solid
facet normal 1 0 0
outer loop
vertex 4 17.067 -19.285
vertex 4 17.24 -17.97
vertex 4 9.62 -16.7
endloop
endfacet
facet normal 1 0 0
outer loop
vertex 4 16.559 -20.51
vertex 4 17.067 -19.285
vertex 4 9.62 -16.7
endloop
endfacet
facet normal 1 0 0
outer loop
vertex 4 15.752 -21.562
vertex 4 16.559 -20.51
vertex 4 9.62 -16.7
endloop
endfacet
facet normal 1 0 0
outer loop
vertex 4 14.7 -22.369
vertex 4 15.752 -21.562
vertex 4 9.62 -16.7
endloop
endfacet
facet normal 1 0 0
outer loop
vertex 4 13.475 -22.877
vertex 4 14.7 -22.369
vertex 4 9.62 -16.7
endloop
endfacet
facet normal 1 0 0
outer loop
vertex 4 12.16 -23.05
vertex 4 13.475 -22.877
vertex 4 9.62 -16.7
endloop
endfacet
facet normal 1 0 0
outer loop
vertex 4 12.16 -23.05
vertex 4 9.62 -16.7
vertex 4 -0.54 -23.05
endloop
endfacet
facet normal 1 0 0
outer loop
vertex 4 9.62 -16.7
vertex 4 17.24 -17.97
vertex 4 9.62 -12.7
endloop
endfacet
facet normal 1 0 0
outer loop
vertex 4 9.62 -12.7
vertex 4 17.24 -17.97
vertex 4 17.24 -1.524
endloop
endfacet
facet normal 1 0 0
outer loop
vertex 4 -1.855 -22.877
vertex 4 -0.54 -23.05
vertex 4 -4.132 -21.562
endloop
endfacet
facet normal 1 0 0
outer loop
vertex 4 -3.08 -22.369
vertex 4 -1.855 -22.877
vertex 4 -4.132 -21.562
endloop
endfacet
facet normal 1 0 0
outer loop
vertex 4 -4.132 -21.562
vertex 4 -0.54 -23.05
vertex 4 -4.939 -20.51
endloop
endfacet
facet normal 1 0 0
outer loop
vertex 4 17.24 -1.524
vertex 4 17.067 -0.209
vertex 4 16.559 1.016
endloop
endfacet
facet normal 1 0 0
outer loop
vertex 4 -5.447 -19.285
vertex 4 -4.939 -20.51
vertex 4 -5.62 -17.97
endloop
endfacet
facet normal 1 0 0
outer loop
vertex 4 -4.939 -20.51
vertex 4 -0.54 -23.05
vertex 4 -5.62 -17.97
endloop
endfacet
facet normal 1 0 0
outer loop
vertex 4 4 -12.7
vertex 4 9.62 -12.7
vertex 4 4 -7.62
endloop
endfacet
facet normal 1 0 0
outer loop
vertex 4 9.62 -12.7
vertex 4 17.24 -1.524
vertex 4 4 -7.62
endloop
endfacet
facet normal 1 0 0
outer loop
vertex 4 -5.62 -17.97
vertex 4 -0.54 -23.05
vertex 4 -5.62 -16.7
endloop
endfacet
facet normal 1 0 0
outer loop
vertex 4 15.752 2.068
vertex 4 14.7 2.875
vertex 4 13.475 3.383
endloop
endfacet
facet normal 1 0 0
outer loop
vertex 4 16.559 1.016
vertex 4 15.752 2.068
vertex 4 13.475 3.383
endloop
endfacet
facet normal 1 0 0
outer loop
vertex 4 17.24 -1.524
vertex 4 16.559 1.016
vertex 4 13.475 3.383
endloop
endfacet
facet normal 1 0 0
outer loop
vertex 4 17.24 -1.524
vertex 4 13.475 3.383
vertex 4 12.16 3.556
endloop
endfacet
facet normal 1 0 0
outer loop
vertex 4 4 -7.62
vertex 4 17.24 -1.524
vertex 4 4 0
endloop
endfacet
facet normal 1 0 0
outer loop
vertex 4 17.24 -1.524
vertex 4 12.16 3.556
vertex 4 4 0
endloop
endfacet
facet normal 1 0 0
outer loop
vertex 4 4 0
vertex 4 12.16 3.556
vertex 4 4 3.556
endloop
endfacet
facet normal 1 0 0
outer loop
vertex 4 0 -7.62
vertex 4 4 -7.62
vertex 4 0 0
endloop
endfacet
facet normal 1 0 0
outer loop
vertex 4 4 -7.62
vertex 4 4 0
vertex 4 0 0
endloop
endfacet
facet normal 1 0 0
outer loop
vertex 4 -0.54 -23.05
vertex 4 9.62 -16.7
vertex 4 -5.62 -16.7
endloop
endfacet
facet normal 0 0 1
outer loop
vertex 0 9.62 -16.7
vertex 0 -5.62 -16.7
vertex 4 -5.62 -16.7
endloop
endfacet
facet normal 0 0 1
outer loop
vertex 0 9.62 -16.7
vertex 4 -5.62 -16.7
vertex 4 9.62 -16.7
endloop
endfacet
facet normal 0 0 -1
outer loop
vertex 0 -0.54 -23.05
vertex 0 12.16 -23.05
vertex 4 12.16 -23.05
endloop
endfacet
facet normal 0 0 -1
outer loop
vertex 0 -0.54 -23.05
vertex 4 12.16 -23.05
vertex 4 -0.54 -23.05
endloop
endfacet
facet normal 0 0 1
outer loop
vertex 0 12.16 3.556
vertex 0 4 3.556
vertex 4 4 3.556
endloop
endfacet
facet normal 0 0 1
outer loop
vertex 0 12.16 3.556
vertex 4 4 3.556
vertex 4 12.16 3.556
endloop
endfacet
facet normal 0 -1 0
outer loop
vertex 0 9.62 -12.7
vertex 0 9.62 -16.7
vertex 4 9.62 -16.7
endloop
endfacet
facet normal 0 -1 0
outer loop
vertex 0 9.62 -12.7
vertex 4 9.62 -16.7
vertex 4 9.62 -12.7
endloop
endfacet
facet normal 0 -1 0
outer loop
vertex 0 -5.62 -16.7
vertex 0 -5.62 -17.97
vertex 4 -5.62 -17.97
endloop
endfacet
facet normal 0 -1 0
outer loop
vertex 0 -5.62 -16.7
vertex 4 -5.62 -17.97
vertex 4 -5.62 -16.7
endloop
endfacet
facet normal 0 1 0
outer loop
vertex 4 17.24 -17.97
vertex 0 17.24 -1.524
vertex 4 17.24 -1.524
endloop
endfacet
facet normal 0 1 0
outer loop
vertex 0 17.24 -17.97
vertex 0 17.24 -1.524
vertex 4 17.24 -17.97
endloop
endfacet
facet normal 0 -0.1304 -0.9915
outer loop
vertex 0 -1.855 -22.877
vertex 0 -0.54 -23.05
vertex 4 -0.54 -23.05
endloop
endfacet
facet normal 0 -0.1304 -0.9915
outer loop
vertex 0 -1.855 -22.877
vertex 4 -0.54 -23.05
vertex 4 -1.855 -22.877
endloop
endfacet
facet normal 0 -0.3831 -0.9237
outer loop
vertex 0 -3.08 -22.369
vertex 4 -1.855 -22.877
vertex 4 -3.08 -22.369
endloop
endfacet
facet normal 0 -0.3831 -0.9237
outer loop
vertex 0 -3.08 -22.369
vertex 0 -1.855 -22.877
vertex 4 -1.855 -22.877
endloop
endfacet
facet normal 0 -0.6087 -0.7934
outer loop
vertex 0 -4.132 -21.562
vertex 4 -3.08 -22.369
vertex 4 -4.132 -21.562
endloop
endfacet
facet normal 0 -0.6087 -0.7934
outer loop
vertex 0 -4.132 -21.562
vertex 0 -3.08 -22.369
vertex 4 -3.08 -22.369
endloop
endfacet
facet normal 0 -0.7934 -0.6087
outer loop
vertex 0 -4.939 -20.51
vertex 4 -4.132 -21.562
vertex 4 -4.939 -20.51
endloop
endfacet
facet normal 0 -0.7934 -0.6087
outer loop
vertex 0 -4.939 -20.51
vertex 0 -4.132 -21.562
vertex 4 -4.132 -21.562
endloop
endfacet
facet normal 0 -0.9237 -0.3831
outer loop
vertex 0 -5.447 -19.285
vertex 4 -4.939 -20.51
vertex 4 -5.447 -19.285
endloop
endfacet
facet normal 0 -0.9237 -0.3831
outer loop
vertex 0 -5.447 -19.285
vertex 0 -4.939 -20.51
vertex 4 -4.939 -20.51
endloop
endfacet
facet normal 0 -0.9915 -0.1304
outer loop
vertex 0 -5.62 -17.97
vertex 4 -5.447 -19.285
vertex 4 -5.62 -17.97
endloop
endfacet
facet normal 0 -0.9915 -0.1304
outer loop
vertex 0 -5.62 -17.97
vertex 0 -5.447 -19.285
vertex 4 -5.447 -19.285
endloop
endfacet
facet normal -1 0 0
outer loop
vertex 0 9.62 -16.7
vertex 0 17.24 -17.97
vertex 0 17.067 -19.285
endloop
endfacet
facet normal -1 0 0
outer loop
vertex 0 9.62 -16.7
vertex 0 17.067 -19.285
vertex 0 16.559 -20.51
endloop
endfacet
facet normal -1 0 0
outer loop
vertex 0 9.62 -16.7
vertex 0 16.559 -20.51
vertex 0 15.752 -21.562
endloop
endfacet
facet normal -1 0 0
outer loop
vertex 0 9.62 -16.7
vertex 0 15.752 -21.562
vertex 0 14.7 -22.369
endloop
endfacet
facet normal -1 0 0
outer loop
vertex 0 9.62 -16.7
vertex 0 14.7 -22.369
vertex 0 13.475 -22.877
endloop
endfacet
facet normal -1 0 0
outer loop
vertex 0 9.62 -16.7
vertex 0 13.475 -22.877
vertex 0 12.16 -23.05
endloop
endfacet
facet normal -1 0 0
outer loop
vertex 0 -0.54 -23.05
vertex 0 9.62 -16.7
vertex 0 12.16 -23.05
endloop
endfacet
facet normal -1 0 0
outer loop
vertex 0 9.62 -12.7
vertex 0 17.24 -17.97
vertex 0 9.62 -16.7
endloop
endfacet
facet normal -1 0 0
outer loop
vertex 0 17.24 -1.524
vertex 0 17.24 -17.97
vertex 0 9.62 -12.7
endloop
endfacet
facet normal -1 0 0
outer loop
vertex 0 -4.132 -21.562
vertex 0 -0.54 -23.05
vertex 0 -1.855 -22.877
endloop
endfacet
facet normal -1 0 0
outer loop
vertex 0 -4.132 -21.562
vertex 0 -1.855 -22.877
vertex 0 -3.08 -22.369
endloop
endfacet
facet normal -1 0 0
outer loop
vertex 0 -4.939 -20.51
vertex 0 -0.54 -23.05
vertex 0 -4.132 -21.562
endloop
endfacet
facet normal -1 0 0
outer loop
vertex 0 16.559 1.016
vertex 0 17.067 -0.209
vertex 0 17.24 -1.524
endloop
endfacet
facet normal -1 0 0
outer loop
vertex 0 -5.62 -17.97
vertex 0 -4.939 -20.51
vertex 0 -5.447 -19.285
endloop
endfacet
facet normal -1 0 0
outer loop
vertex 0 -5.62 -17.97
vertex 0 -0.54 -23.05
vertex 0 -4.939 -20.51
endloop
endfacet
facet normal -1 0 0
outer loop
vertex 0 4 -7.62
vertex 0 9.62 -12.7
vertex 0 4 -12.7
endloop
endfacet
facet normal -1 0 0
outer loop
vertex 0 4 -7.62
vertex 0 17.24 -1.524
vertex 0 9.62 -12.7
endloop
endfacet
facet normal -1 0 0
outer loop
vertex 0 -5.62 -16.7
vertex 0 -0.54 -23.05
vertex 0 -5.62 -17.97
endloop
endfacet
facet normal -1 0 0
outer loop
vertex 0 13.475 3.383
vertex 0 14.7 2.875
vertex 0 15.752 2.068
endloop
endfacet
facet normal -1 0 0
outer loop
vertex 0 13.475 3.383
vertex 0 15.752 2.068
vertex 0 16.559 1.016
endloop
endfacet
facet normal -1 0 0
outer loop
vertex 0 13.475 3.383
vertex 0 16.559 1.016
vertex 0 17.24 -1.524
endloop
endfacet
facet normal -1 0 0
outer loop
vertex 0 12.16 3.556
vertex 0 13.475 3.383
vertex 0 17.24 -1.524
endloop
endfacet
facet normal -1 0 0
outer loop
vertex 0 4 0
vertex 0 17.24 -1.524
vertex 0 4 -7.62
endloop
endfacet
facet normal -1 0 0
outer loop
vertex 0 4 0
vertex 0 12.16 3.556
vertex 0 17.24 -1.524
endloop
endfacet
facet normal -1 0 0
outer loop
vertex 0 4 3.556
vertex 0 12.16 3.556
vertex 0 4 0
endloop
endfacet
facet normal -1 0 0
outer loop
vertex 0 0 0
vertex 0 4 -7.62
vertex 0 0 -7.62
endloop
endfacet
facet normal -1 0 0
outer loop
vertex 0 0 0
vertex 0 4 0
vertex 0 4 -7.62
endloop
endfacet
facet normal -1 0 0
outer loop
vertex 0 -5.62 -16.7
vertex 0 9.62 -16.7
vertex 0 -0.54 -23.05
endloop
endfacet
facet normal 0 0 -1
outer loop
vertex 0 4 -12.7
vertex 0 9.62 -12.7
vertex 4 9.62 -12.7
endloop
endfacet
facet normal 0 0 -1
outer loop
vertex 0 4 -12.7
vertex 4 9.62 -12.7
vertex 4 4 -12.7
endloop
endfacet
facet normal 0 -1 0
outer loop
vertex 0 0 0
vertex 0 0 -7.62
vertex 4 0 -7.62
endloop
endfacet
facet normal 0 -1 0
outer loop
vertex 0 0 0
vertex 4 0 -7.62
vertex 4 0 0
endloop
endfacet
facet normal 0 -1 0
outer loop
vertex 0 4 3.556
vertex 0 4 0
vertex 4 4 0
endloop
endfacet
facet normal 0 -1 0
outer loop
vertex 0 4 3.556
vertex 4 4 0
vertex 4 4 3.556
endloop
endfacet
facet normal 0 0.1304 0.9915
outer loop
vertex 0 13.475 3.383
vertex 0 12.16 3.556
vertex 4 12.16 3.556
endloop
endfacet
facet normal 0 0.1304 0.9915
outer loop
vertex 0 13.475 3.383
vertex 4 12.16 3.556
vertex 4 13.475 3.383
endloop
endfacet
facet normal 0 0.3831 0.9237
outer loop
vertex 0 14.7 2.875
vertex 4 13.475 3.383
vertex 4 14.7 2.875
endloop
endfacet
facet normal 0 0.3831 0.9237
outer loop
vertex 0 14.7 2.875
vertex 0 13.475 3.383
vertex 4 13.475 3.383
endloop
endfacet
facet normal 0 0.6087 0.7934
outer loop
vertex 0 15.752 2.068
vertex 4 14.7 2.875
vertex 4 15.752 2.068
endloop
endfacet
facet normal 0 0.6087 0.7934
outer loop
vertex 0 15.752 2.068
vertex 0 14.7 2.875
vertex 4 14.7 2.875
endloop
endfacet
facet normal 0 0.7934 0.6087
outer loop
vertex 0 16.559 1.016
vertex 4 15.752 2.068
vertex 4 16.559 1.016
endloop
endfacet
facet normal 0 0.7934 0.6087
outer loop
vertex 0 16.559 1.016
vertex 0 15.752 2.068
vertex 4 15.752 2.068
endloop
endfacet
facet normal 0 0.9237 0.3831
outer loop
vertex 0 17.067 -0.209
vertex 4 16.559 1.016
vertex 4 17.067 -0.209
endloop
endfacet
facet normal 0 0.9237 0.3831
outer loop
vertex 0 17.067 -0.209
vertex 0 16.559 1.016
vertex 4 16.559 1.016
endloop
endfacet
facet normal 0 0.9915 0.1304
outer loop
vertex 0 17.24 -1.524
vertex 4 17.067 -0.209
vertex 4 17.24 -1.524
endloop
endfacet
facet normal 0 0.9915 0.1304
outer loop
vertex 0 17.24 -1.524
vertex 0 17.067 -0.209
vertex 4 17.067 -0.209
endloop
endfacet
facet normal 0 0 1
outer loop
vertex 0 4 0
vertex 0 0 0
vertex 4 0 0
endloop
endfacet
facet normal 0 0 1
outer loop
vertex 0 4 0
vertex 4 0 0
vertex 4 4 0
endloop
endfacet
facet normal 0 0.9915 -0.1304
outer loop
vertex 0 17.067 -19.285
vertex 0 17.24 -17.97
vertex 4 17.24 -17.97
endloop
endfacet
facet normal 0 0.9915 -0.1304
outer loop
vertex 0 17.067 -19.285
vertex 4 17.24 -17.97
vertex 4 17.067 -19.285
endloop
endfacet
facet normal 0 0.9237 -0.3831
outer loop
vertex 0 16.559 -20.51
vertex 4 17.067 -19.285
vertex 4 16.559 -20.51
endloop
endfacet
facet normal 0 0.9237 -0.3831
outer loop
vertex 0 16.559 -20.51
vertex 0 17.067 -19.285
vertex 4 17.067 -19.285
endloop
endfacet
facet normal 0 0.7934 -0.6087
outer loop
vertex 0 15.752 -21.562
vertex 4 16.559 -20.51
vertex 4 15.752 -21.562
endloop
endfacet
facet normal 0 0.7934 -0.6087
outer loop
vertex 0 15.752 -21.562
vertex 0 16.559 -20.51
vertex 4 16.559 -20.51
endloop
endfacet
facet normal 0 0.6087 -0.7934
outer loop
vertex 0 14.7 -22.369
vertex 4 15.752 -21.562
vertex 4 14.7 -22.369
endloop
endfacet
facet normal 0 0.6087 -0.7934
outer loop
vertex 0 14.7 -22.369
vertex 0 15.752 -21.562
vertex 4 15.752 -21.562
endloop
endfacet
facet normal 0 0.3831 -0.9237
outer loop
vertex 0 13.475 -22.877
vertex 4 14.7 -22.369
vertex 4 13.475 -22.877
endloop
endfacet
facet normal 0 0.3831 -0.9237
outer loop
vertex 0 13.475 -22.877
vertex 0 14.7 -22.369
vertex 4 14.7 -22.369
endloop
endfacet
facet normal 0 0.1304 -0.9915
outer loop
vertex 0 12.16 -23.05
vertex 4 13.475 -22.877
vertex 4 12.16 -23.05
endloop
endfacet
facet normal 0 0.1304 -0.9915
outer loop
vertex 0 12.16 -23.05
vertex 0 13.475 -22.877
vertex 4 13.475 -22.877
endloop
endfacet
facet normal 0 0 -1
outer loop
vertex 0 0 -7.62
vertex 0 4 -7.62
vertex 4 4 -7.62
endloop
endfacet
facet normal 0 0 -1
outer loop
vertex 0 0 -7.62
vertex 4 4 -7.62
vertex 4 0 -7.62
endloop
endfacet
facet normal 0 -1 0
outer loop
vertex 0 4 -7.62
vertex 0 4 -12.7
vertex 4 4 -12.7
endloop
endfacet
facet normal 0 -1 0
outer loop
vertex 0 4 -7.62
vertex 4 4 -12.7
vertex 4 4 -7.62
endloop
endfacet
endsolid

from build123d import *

# Parameters (mm, degrees)
BOSS_EXTRUDE1_DEPTH = 4


with BuildPart() as part:
    # Sketch1 → Boss-Extrude1 (new body)
    with BuildSketch(Plane.YZ):
        with BuildLine():
            Line((0, 0), (4, 0))
            Line((4, 0), (4, 3.556))
            Line((4, 3.556), (12.16, 3.556))
            ThreePointArc((12.16, 3.556), (15.752102448, 2.068102448), (17.24, -1.524))
            Line((17.24, -1.524), (17.24, -17.97))
            ThreePointArc((17.24, -17.97), (15.752102448, -21.562102448), (12.16, -23.05))
            Line((12.16, -23.05), (-0.54, -23.05))
            ThreePointArc((-0.54, -23.05), (-4.132102448, -21.562102448), (-5.62, -17.97))
            Line((-5.62, -17.97), (-5.62, -16.7))
            Line((-5.62, -16.7), (9.62, -16.7))
            Line((9.62, -16.7), (9.62, -12.7))
            Line((9.62, -12.7), (4, -12.7))
            Line((4, -12.7), (4, -7.62))
            Line((4, -7.62), (0, -7.62))
            Line((0, -7.62), (0, 0))
        make_face()
    extrude(amount=BOSS_EXTRUDE1_DEPTH)


solid = part.part
